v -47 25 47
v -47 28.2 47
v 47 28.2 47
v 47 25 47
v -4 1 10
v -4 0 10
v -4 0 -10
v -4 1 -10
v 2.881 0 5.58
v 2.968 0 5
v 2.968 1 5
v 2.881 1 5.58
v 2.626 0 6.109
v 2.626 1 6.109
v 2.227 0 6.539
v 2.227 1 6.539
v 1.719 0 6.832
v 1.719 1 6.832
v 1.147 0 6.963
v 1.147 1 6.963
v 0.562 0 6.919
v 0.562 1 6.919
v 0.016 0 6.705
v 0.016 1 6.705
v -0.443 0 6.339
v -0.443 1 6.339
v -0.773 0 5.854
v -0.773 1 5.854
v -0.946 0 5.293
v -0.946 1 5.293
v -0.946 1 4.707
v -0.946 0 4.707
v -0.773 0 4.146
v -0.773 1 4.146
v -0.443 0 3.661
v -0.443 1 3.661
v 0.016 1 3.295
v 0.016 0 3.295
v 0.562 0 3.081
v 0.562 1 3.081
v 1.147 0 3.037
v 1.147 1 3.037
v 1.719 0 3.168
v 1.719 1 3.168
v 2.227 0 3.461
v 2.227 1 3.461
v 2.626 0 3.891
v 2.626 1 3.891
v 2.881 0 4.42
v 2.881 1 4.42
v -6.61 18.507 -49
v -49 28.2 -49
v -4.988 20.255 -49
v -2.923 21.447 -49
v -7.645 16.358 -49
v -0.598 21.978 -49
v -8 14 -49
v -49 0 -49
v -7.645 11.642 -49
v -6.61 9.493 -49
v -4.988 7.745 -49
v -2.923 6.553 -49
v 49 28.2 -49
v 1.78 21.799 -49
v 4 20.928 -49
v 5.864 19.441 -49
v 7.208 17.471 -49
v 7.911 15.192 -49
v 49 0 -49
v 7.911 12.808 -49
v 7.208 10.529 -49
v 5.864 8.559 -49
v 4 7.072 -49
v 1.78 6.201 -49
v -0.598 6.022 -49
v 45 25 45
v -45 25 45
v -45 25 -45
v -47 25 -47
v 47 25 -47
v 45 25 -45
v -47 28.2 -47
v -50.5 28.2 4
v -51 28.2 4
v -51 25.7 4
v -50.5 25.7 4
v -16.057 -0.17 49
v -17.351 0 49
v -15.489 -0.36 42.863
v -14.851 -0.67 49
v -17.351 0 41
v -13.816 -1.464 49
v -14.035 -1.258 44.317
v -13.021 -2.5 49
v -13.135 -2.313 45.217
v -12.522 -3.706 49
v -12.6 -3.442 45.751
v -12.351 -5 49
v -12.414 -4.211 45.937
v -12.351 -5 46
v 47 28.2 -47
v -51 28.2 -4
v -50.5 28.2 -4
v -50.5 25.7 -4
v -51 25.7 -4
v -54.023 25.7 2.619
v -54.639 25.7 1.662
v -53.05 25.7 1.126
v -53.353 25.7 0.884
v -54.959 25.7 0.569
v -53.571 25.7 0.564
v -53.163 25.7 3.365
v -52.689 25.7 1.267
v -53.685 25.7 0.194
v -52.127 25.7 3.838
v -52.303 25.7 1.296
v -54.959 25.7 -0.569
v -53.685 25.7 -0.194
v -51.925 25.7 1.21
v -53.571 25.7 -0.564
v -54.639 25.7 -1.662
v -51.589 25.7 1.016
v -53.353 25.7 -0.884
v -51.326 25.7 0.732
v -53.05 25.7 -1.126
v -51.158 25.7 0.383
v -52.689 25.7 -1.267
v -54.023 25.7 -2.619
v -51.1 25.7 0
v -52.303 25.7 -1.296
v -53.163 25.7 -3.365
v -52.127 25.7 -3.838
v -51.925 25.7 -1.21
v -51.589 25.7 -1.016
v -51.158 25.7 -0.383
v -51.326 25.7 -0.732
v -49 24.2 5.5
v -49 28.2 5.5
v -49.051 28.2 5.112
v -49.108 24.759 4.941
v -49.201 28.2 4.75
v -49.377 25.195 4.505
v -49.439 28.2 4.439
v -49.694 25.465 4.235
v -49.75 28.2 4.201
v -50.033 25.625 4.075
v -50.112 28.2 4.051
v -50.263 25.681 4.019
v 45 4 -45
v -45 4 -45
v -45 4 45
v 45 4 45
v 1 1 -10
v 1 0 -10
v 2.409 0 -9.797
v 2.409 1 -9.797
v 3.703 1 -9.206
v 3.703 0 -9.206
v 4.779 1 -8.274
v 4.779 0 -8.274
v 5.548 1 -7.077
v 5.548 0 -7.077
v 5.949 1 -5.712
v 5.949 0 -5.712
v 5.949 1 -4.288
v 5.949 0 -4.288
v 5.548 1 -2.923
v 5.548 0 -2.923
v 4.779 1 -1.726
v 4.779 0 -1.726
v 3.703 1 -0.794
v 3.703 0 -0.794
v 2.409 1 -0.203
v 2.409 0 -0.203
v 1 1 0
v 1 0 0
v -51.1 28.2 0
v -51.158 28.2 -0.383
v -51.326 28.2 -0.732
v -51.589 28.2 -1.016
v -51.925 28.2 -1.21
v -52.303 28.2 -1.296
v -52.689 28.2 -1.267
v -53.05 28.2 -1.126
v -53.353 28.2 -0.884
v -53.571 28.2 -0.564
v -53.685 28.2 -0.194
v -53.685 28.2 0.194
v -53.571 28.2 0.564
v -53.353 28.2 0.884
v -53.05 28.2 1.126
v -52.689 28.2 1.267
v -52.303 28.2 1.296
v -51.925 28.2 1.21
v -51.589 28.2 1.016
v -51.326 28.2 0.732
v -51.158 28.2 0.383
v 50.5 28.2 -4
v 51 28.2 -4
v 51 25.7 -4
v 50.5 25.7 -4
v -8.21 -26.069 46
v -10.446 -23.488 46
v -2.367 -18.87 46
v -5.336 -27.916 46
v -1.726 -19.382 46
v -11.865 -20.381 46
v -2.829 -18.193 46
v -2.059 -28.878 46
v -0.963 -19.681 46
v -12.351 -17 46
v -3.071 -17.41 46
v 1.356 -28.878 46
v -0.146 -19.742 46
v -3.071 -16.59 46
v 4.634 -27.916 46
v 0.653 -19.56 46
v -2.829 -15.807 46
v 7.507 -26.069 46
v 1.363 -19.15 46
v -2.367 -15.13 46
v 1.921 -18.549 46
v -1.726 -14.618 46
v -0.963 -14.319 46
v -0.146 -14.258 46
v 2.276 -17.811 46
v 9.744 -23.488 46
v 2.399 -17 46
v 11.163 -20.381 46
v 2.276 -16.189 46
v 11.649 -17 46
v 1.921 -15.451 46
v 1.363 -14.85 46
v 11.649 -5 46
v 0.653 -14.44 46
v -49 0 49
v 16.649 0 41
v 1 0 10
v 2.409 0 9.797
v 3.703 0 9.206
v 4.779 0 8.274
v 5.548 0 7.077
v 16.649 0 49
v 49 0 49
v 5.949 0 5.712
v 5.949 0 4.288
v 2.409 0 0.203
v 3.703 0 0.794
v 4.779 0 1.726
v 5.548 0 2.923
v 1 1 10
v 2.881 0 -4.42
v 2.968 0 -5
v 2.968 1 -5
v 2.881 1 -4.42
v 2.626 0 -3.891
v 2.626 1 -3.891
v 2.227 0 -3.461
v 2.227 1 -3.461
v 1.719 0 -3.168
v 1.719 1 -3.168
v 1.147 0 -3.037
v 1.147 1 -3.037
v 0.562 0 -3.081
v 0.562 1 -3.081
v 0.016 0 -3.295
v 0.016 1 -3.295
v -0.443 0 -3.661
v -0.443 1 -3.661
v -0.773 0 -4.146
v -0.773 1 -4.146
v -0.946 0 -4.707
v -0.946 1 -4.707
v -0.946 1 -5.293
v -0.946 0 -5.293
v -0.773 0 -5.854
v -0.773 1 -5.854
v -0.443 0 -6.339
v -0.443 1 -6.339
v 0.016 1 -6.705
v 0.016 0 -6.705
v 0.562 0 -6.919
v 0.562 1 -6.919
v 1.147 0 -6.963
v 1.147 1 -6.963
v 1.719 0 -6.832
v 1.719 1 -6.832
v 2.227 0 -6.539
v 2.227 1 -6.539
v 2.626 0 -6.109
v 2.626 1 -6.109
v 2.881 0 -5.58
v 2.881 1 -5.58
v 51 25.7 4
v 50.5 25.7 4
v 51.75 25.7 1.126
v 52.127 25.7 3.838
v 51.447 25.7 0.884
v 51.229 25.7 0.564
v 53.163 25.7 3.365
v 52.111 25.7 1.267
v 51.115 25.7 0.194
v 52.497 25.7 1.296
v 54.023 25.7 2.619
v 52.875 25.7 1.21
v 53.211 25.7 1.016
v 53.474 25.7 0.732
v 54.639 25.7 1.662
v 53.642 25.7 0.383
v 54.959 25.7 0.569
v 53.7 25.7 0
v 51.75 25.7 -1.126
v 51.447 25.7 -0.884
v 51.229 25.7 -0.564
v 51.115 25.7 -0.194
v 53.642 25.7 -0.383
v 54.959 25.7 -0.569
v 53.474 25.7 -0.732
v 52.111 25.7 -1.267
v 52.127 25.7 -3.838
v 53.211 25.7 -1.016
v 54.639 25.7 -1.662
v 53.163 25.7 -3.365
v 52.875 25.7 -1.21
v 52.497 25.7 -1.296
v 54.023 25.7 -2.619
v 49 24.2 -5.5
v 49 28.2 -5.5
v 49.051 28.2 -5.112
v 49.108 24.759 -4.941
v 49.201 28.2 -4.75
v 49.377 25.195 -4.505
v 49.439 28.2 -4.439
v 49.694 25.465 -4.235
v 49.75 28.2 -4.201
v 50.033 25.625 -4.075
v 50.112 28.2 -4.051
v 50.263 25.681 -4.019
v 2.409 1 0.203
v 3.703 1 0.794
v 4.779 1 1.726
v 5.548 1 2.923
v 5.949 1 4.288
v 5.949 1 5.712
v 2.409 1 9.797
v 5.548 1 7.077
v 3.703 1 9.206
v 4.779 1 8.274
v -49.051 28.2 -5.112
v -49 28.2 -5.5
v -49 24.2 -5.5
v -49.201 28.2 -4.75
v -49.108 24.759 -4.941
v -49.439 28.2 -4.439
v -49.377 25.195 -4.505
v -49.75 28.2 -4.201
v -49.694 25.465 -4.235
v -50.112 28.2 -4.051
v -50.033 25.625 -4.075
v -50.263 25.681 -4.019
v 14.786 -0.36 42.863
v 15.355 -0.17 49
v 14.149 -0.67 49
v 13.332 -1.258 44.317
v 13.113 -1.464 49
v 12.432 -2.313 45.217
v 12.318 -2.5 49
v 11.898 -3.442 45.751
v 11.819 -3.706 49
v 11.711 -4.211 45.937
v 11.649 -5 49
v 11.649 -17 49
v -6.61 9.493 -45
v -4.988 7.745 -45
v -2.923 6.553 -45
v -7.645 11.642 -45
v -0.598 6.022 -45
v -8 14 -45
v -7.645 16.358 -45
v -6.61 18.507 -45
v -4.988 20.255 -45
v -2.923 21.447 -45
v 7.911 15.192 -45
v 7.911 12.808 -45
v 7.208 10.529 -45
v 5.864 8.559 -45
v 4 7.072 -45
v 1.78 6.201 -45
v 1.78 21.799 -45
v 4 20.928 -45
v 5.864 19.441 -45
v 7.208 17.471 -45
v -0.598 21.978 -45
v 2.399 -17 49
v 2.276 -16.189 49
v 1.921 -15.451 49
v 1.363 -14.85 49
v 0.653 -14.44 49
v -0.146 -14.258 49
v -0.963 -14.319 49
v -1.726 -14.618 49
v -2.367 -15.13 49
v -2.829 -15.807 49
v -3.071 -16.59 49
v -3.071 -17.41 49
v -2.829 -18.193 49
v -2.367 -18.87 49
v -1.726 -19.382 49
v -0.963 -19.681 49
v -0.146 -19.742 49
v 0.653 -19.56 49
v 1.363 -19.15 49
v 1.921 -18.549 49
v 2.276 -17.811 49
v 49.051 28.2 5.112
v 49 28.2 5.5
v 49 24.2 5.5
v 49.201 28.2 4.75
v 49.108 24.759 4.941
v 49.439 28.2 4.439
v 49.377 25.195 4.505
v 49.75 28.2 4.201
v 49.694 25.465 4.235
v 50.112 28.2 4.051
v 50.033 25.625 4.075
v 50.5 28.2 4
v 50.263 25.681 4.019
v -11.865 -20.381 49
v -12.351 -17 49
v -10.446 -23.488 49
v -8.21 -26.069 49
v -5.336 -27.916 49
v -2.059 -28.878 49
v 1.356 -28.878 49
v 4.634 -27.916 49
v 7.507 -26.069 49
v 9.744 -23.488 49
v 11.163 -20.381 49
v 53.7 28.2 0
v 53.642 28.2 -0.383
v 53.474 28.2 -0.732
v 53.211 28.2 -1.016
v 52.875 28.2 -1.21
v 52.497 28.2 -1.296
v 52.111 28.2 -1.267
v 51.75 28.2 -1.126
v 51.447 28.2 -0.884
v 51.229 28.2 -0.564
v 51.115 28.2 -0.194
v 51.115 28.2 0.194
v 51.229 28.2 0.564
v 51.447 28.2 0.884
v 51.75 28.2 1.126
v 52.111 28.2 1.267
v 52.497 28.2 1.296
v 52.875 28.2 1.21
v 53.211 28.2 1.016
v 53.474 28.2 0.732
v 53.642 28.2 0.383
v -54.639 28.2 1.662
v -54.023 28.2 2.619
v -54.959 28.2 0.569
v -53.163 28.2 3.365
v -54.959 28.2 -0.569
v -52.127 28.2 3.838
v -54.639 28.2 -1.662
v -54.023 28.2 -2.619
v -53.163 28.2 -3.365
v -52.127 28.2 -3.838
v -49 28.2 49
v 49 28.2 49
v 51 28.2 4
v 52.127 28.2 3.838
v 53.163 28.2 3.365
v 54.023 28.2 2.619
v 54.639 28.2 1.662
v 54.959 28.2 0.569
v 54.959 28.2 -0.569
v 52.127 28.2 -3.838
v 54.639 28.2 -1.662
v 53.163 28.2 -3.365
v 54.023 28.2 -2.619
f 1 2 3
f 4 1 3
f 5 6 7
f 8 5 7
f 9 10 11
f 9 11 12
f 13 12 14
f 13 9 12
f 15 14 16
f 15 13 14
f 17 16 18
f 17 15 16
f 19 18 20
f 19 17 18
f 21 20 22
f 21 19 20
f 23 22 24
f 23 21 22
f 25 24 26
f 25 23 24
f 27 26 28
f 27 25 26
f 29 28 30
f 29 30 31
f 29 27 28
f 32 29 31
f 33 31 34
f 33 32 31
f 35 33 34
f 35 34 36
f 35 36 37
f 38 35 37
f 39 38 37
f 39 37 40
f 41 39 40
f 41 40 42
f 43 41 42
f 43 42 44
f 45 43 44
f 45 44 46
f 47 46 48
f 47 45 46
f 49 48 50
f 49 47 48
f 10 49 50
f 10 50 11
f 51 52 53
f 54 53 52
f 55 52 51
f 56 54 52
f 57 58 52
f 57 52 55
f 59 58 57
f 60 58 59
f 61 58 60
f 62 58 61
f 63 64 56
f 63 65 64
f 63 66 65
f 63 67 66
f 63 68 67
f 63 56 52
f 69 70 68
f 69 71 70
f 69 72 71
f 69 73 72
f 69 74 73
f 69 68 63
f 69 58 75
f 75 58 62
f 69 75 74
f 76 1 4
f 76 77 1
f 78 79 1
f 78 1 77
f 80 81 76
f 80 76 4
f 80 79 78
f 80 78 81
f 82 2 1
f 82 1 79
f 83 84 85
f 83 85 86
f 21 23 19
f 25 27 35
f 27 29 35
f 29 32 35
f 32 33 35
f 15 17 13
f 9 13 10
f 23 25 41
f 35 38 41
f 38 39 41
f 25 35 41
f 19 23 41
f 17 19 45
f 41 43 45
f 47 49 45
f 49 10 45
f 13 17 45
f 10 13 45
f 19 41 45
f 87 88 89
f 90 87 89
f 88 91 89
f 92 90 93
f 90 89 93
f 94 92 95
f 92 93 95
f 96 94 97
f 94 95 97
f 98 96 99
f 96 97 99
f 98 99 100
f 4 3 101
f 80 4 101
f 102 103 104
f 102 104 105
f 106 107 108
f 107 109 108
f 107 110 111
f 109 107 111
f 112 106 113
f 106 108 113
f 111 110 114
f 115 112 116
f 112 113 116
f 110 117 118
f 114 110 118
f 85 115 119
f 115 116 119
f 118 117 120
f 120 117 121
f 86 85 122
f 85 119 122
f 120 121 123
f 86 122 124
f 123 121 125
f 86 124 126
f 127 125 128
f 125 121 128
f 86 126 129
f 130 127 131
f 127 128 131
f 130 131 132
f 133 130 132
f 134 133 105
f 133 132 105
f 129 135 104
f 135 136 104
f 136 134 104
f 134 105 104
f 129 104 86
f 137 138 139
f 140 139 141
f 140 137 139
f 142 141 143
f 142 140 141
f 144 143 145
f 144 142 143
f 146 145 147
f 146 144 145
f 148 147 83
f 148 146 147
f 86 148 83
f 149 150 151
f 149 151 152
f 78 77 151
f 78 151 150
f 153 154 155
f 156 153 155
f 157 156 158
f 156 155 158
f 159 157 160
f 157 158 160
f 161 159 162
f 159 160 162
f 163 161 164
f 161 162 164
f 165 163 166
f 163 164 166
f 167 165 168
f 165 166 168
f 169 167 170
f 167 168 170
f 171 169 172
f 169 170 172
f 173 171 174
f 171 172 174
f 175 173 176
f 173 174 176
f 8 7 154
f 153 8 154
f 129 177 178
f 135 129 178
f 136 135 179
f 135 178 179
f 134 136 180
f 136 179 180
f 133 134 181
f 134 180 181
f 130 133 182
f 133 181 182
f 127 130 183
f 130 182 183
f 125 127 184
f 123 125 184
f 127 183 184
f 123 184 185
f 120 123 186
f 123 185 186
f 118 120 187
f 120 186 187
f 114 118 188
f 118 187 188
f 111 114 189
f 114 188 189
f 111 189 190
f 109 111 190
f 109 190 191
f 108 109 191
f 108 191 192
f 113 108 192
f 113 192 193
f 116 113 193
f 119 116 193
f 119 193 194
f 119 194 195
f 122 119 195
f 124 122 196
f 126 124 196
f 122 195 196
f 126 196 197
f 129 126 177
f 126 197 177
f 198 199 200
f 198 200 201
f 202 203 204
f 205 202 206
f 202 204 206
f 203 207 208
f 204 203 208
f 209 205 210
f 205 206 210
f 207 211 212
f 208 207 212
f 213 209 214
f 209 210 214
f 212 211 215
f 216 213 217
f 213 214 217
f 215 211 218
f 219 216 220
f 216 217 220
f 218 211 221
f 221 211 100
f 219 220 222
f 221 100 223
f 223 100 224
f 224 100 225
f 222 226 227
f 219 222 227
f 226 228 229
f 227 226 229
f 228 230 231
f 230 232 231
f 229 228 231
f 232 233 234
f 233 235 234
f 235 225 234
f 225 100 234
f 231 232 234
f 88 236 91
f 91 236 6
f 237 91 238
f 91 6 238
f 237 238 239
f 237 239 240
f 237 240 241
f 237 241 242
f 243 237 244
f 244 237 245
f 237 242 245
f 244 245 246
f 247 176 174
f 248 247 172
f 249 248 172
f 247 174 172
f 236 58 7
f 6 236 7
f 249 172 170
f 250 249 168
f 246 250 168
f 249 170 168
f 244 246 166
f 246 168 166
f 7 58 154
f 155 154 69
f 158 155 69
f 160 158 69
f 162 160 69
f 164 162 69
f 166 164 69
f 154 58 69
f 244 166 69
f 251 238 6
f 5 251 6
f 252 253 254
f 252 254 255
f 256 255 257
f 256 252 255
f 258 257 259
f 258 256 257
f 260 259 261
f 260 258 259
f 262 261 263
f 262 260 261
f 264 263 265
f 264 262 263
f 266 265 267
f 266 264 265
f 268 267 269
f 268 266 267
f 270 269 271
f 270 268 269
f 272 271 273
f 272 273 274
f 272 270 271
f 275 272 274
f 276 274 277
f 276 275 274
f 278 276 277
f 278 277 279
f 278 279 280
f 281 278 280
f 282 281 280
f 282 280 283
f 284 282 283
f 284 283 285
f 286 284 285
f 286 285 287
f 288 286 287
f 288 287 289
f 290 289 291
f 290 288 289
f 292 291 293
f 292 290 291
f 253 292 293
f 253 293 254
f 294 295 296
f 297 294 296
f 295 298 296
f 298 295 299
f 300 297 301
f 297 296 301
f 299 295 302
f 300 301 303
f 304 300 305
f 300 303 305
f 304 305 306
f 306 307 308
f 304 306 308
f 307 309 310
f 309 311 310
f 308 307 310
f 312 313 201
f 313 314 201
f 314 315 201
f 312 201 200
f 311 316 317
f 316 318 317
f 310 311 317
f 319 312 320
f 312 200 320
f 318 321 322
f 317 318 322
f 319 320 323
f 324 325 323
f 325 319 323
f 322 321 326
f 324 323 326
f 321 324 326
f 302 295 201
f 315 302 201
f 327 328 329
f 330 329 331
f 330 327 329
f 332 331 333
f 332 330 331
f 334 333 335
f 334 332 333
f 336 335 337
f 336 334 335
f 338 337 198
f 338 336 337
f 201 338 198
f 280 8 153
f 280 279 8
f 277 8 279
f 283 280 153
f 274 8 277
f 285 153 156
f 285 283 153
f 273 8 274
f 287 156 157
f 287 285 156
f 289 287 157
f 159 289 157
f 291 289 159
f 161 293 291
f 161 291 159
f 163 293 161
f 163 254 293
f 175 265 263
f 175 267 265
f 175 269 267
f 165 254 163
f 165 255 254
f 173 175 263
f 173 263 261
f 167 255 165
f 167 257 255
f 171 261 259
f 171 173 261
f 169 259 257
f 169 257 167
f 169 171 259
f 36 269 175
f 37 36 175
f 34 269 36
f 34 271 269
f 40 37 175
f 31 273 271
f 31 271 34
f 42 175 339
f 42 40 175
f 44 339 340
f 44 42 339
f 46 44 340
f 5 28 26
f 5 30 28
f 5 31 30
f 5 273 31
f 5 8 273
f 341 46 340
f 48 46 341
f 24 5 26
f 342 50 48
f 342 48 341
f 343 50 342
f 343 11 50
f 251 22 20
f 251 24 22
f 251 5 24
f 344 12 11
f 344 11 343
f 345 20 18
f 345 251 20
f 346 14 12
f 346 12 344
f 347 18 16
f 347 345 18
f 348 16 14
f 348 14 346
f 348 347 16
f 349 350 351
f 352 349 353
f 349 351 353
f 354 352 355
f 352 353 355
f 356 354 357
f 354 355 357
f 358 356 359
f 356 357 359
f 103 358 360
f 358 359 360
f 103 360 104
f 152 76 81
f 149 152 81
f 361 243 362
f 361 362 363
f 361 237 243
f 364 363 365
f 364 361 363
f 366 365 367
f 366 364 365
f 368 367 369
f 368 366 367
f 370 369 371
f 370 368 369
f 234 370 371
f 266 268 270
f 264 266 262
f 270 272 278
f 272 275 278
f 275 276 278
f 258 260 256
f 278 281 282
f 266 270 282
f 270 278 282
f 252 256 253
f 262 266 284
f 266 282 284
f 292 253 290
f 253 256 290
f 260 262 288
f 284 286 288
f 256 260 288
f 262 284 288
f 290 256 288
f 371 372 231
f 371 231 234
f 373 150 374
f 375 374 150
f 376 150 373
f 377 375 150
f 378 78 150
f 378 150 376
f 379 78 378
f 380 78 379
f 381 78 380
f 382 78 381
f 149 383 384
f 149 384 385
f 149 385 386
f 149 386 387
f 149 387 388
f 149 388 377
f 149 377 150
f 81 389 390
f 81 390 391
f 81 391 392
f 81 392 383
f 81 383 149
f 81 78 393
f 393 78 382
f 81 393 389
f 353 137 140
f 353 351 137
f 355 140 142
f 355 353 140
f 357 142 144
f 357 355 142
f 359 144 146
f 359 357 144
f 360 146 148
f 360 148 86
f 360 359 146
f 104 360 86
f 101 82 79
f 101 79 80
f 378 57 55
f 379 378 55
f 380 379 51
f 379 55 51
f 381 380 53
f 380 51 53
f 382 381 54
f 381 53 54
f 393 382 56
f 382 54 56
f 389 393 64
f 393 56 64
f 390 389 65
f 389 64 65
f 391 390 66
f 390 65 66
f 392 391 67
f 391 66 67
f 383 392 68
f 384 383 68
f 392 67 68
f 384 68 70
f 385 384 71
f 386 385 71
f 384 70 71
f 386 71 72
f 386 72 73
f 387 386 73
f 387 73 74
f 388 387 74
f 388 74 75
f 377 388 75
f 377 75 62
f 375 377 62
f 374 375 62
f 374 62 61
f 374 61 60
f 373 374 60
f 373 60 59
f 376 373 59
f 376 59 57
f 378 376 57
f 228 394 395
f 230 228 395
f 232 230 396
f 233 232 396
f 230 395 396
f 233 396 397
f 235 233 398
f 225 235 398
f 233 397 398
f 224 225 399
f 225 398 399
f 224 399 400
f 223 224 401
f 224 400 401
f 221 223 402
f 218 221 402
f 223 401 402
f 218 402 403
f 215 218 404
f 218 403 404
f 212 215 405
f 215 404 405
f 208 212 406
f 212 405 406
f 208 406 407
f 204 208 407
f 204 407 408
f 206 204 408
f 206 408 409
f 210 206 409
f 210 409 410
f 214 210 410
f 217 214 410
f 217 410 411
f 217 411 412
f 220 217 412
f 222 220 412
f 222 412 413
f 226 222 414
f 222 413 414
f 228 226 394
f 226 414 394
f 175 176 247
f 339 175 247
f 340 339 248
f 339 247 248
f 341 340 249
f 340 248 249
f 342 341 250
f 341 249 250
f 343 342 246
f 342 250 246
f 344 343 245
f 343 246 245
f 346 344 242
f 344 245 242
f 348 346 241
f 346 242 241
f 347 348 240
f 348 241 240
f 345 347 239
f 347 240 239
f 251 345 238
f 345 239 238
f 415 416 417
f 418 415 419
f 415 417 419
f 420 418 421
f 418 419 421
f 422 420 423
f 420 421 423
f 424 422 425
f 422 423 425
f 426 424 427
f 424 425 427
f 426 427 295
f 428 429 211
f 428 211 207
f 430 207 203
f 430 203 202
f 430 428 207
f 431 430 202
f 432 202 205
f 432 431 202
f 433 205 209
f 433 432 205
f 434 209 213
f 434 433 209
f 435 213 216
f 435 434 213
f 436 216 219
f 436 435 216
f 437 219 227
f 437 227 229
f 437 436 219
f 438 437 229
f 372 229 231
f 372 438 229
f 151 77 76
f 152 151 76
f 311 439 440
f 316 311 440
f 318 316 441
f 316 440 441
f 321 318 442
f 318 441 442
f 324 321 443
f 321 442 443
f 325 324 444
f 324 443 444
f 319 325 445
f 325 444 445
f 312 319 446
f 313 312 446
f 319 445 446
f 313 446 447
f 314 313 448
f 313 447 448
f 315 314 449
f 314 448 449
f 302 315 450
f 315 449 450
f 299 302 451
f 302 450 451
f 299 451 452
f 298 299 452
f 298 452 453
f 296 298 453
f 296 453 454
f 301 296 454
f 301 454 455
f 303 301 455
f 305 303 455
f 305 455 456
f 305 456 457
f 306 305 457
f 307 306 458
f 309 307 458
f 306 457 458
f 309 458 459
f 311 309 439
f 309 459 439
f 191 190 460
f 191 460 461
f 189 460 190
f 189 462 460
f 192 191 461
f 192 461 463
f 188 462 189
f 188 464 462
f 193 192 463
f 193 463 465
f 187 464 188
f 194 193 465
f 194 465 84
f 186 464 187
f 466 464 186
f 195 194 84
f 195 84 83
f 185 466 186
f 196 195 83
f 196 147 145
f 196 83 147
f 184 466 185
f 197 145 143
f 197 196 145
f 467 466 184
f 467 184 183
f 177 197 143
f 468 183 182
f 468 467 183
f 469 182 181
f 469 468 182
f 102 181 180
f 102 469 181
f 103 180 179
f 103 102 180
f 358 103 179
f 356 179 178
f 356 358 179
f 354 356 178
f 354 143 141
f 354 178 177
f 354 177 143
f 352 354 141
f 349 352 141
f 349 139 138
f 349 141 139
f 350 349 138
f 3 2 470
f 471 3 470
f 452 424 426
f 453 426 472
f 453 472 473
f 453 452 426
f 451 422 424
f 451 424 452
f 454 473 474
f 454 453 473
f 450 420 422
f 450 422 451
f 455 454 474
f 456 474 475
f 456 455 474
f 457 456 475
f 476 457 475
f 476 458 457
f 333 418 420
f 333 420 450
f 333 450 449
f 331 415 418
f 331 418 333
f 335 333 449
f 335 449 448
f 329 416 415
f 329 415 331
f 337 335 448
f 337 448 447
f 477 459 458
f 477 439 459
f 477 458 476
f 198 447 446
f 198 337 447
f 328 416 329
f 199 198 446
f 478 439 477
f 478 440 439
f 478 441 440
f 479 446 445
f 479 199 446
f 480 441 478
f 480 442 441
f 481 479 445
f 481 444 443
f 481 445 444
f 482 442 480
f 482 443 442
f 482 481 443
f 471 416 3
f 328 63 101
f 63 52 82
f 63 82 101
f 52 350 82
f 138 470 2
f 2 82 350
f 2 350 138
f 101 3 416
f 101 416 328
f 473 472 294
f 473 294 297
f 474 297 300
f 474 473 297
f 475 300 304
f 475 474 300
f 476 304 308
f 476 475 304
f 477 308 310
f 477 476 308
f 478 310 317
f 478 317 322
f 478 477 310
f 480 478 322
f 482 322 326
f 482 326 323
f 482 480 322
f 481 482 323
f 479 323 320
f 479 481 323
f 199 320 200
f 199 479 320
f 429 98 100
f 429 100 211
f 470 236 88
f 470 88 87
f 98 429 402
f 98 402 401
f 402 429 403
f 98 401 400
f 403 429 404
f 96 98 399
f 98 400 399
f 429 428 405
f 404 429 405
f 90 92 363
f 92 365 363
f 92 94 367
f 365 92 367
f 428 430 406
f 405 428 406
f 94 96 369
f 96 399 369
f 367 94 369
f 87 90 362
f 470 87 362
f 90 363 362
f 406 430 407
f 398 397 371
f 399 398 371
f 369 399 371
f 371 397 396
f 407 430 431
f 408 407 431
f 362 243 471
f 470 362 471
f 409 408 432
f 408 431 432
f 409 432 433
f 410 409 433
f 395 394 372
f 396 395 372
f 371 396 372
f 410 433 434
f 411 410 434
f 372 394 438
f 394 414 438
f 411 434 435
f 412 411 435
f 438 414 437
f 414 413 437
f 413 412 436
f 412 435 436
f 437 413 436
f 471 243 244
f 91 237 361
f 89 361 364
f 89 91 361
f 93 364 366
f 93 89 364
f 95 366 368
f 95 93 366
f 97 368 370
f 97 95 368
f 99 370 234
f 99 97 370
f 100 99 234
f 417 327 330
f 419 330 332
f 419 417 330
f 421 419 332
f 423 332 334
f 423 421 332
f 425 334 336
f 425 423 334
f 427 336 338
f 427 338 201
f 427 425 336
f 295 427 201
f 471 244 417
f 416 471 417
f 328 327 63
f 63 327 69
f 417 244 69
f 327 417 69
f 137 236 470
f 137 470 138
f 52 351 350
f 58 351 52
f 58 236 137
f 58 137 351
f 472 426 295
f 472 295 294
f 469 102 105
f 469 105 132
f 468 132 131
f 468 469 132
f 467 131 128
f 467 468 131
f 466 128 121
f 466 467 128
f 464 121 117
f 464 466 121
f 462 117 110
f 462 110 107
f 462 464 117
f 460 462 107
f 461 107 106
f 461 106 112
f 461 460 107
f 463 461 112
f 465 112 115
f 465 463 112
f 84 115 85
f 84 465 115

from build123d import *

# Parameters (mm, degrees)
SKETCH1_W           = 98
SKETCH1_H           = 98
BOSS_EXTRUDE1_DEPTH = 30
SKETCH2_W           = 94
SKETCH2_H           = 94
CUT_EXTRUDE1_DEPTH  = 5
SKETCH3_W           = 90
SKETCH3_H           = 90
CUT_EXTRUDE2_DEPTH  = 21
SKETCH4_W           = 98
SKETCH4_H           = 98
SKETCH4_W_2         = 94
SKETCH4_H_2         = 94
CUT_EXTRUDE3_DEPTH  = 1.8
SKETCH5_R           = 1.3
BOSS_EXTRUDE2_DEPTH = 2.5
FILLET1_R           = 1.5
FILLET2_R           = 1.5
CUT_EXTRUDE4_REACH  = 100
SKETCH6_R           = 8
SKETCH7_R           = 1.968352886
CUT_EXTRUDE5_DEPTH  = 1
SKETCH8_R           = 2.75
BOSS_EXTRUDE3_DEPTH = 3
FILLET3_R           = 5


with BuildPart() as part:
    # Sketch1 → Boss-Extrude1 (new body)
    with BuildSketch(Plane(origin=(0, 0, 0), x_dir=(1, 0, 0), z_dir=(0, 1, 0))):
        Rectangle(SKETCH1_W, SKETCH1_H)
    extrude(amount=BOSS_EXTRUDE1_DEPTH)

    # Sketch2 → Cut-Extrude1 (cut)
    with BuildSketch(Plane(origin=(0, 30, 0), x_dir=(1, 0, 0), z_dir=(0, 1, 0))):
        Rectangle(SKETCH2_W, SKETCH2_H)
    extrude(amount=-CUT_EXTRUDE1_DEPTH, mode=Mode.SUBTRACT)

    # Sketch3 → Cut-Extrude2 (cut)
    with BuildSketch(Plane(origin=(0, 25, 0), x_dir=(1, 0, 0), z_dir=(0, 1, 0))):
        Rectangle(SKETCH3_W, SKETCH3_H)
    extrude(amount=-CUT_EXTRUDE2_DEPTH, mode=Mode.SUBTRACT)

    # Sketch4 → Cut-Extrude3 (cut)
    with BuildSketch(Plane(origin=(0, 30, 0), x_dir=(1, 0, 0), z_dir=(0, 1, 0))):
        Rectangle(SKETCH4_W, SKETCH4_H)
        Rectangle(SKETCH4_W_2, SKETCH4_H_2, mode=Mode.SUBTRACT)
    extrude(amount=-CUT_EXTRUDE3_DEPTH, mode=Mode.SUBTRACT)

    # Sketch5 → Boss-Extrude2 (add)
    with BuildSketch(Plane(origin=(0, 28.2, 0), x_dir=(1, 0, 0), z_dir=(0, 1, 0))):
        with BuildLine():
            Line((-49, 4), (-51, 4))
            ThreePointArc((-51, 4), (-55, 0), (-51, -4))
            Line((-51, -4), (-49, -4))
            Line((-49, -4), (-49, 4))
        make_face()
        with Locations((-52.4, 0)):
            Circle(SKETCH5_R, mode=Mode.SUBTRACT)
        with BuildLine():
            Line((49, 4), (49, -4))
            Line((49, -4), (51, -4))
            ThreePointArc((51, -4), (55, 0), (51, 4))
            Line((51, 4), (49, 4))
        make_face()
        with Locations((52.4, 0)):
            Circle(SKETCH5_R, mode=Mode.SUBTRACT)
    extrude(amount=-BOSS_EXTRUDE2_DEPTH)

    # Fillet1
    fillet1_edges = [part.edges().sort_by_distance(p)[0] for p in [
        (-49, 25.7, 0),
        (-49, 26.95, -4),
        (-49, 26.95, 4),
    ]]
    fillet(fillet1_edges, radius=FILLET1_R)

    # Fillet2
    fillet2_edges = [part.edges().sort_by_distance(p)[0] for p in [
        (49, 26.95, -4),
        (49, 25.7, 0),
        (49, 26.95, 4),
    ]]
    fillet(fillet2_edges, radius=FILLET2_R)

    # Sketch6 → Cut-Extrude4 (cut, up to next)
    with BuildSketch(Plane(origin=(0, 0, -49), x_dir=(-1, 0, 0), z_dir=(0, 0, -1)), mode=Mode.PRIVATE) as cut_extrude4_sk1:
        with Locations((0, 14)):
            Circle(SKETCH6_R)
    cut_extrude4_tool1 = extrude(cut_extrude4_sk1.sketch, amount=-CUT_EXTRUDE4_REACH, mode=Mode.PRIVATE) & part.part
    add(cut_extrude4_tool1.solids().sort_by_distance((0, 14, -49))[0], mode=Mode.SUBTRACT)

    # Sketch7 → Cut-Extrude5 (cut)
    with BuildSketch(Plane.XZ):
        with BuildLine():
            Line((-4, -10), (-1, -10))
            Line((-1, -10), (1, -10))
            ThreePointArc((1, -10), (6, -5), (1, 0))
            ThreePointArc((1, 0), (6, 5), (1, 10))
            Line((1, 10), (-4, 10))
            Line((-4, 10), (-4, -10))
        make_face()
        with Locations((1, 5)):
            Circle(SKETCH7_R, mode=Mode.SUBTRACT)
        with Locations((1, -5)):
            Circle(SKETCH7_R, mode=Mode.SUBTRACT)
    extrude(amount=-CUT_EXTRUDE5_DEPTH, mode=Mode.SUBTRACT)

    # Sketch8 → Boss-Extrude3 (add)
    with BuildSketch(Plane.XY.offset(49)):
        with BuildLine():
            Line((11.648602748, -17), (11.648602748, 0))
            Line((11.648602748, 0), (-12.351397252, 0))
            Line((-12.351397252, 0), (-12.351397252, -17))
            ThreePointArc((-12.351397252, -17), (-0.351397252, -29), (11.648602748, -17))
        make_face()
        with Locations((-0.351397252, -17)):
            Circle(SKETCH8_R, mode=Mode.SUBTRACT)
    extrude(amount=-BOSS_EXTRUDE3_DEPTH)

    # Fillet3
    fillet3_edges = [part.edges().sort_by_distance(p)[0] for p in [
        (-0.351397252, 0, 46),
        (-12.351397252, 0, 47.5),
        (11.648602748, 0, 47.5),
    ]]
    fillet(fillet3_edges, radius=FILLET3_R)


solid = part.part
